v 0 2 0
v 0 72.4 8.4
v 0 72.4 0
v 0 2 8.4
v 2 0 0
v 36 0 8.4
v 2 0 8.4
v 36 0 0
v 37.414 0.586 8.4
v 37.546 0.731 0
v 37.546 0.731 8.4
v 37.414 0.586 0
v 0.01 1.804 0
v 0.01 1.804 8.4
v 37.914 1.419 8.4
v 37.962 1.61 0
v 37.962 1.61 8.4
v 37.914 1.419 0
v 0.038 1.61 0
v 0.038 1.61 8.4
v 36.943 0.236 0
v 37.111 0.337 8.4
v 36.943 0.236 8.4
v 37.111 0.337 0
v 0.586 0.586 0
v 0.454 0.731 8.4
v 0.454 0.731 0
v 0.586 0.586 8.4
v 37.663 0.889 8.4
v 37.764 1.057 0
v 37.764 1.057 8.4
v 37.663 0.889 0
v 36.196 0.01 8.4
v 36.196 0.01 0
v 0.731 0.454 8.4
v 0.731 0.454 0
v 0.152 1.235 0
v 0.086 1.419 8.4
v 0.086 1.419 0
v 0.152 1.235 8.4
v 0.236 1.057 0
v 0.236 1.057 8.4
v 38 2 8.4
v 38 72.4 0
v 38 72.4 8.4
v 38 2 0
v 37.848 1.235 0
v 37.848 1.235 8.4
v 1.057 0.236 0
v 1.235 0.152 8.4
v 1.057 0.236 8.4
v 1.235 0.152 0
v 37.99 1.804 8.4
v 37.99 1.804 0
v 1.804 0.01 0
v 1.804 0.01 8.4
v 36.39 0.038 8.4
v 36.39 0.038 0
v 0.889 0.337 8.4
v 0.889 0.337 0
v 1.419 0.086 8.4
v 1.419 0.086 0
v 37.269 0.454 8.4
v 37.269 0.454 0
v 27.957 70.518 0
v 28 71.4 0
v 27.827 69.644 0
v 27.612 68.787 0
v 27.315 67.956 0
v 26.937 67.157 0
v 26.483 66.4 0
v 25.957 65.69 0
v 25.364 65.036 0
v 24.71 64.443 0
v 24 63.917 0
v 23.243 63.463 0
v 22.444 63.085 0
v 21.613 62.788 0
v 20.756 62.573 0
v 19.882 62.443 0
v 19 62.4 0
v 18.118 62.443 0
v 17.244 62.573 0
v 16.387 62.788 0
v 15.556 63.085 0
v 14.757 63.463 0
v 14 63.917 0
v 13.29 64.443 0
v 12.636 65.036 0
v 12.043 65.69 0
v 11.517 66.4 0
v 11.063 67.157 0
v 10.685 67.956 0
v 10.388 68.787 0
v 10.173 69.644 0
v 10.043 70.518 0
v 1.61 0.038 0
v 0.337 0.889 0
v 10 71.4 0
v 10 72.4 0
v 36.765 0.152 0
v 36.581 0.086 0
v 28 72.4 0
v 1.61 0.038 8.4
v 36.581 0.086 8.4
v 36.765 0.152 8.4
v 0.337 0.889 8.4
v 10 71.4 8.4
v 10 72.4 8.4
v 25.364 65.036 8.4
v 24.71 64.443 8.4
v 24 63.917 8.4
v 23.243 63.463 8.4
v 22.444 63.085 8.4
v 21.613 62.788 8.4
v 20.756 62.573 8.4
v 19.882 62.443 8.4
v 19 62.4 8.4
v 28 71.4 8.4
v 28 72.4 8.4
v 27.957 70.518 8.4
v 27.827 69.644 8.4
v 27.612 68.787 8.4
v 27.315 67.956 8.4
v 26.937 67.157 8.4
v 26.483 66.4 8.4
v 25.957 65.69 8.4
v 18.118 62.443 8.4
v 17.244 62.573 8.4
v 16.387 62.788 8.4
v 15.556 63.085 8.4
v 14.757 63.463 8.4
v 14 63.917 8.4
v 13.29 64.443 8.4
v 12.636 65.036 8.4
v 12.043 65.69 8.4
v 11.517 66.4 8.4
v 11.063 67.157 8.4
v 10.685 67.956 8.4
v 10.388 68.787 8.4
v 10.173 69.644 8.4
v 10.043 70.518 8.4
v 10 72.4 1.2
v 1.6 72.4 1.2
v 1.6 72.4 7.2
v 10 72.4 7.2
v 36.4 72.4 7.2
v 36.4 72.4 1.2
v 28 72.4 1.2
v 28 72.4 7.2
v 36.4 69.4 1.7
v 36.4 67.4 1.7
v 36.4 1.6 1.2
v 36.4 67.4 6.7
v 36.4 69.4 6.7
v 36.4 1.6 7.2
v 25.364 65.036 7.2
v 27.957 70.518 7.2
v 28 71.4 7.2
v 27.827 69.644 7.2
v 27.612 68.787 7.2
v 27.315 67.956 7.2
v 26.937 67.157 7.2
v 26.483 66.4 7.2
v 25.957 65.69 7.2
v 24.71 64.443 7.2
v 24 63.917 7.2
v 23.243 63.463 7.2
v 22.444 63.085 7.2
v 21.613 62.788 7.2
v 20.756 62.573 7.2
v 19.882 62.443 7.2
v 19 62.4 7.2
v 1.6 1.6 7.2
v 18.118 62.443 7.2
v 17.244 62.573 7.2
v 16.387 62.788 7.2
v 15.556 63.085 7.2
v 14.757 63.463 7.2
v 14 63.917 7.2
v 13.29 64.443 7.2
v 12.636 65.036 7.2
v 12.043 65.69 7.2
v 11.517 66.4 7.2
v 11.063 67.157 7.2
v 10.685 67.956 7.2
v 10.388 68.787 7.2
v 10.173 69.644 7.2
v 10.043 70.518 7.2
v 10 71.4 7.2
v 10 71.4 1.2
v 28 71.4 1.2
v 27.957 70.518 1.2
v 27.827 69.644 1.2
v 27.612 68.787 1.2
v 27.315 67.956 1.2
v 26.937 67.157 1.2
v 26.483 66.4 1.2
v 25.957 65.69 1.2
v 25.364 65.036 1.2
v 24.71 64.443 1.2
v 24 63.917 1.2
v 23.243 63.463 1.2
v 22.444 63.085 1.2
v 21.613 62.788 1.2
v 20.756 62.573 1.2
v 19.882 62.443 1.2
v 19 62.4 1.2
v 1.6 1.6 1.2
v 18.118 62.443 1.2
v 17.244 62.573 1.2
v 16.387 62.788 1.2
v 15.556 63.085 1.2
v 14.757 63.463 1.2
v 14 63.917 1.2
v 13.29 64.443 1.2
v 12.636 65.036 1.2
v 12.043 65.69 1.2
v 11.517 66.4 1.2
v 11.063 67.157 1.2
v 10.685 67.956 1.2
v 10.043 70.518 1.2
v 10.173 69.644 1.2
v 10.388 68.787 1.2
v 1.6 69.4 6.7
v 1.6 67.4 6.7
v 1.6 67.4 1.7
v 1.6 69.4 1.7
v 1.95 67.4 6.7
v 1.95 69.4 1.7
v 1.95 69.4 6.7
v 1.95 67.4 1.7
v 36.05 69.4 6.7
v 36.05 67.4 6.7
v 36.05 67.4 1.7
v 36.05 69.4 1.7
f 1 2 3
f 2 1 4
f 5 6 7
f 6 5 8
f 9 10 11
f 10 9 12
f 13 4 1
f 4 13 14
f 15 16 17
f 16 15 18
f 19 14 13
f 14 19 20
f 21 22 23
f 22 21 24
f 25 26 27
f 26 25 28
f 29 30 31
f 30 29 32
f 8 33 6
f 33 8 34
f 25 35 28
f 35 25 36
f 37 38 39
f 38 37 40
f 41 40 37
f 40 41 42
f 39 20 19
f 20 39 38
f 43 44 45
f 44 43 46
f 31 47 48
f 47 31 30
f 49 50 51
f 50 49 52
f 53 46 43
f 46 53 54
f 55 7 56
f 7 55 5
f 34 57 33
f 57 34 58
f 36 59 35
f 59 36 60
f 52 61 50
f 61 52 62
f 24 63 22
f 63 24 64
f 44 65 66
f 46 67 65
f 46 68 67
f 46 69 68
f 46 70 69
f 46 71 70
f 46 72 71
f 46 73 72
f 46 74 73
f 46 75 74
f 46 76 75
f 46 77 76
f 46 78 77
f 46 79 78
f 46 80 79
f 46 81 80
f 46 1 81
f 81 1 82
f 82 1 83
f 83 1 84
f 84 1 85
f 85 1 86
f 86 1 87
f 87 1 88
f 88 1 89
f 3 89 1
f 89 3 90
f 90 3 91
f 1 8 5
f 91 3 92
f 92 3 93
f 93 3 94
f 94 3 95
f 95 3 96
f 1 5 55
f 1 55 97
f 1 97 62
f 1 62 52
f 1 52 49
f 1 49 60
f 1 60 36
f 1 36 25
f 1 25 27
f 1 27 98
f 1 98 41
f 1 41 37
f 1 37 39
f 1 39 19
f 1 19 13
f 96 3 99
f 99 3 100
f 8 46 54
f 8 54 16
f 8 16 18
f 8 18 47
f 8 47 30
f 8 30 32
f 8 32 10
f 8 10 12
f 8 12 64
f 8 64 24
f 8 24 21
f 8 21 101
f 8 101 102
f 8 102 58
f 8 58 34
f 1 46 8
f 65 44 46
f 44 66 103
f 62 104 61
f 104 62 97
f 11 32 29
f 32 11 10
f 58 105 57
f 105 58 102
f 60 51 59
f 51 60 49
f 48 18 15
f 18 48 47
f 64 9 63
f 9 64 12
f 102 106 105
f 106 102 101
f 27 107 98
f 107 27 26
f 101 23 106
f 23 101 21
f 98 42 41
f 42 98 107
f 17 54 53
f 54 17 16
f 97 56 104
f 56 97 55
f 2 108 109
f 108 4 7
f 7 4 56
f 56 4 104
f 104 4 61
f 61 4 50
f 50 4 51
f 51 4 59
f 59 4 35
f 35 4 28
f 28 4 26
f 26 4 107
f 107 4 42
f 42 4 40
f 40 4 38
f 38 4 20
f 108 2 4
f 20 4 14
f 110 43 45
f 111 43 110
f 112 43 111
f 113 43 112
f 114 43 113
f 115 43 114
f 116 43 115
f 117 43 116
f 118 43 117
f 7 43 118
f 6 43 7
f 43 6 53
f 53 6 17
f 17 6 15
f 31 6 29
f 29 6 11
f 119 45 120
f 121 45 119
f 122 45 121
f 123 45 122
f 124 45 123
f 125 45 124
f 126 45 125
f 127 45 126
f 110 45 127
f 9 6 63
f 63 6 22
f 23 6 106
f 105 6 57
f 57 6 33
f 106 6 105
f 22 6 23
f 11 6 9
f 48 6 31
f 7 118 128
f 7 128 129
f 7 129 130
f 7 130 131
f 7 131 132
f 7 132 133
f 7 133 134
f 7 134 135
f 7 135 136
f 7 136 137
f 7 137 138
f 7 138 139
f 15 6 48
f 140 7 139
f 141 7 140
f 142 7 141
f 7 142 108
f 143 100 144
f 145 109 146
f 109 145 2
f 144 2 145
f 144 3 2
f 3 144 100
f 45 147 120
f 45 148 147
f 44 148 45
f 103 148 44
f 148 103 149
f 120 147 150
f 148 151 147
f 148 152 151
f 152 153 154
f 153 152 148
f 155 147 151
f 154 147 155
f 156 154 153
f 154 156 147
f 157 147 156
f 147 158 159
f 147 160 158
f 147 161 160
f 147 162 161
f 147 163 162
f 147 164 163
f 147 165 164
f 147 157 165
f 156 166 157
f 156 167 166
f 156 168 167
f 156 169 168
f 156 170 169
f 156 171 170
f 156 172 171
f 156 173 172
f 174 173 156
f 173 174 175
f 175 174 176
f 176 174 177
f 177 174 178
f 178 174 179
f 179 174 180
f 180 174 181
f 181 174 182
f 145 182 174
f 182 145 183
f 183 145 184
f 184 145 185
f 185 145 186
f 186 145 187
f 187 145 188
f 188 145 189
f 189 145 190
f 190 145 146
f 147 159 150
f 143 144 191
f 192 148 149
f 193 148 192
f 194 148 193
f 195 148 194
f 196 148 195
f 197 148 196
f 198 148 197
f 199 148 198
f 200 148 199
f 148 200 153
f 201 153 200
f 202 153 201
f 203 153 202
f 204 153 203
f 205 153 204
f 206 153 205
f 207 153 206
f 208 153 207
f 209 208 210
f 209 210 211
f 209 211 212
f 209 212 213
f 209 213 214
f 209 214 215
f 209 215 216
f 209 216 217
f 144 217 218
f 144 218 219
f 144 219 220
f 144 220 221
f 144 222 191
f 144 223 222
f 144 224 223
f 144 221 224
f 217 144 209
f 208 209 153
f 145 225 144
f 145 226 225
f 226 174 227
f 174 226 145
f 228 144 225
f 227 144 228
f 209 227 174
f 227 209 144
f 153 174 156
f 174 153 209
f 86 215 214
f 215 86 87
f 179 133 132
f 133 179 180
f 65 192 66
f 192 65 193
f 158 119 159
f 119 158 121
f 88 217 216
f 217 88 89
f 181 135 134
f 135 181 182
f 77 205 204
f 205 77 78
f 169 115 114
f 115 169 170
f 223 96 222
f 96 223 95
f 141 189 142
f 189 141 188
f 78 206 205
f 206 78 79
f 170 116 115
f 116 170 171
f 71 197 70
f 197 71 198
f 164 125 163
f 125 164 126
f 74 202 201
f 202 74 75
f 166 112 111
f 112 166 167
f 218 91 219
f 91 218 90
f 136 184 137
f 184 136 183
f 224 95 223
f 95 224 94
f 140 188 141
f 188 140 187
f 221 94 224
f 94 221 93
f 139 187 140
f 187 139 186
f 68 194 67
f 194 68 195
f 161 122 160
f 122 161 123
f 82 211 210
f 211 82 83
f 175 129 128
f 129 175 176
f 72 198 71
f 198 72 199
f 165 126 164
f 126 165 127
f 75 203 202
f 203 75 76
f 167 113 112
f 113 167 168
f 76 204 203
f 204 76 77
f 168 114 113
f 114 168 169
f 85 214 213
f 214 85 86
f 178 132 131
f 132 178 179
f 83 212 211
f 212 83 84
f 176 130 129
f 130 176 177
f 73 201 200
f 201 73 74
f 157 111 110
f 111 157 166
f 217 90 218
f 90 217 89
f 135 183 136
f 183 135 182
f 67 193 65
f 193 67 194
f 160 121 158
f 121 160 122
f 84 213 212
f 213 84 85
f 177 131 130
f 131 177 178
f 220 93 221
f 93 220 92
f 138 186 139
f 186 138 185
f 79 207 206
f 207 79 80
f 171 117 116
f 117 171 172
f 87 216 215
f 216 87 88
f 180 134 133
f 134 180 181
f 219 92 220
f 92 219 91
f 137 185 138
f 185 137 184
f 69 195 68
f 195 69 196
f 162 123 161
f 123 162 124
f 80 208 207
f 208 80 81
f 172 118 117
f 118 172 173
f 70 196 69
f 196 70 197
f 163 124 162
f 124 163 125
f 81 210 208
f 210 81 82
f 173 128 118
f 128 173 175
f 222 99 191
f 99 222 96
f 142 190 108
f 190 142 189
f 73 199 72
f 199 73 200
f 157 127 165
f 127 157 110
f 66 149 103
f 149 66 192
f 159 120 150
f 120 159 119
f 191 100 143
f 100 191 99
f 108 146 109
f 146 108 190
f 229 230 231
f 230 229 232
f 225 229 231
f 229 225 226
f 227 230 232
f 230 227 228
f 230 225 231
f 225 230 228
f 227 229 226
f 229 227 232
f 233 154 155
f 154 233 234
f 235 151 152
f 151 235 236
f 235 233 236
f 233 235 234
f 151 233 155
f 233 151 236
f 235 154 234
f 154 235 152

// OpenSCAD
// EC2M2 case (transport/storage) - same geometry as gen/enclosure.py
width = 34;  // 34 or 54
board_len = 70.0; clear = 0.4; inner_h = 6.0;
wall = 1.6; skin = 1.2; r = 2.0; notch_w = 18.0; notch_d = 10.0; bump = 0.35;
iw = width + 2*clear; il = board_len + 2*clear; ih = inner_h;
ow = iw + 2*wall; ol = il + wall; oh = ih + 2*skin;
$fn = 64;
module rbox(x, y, z) hull() for (cx = [r, x-r], cy = [r, y-r]) translate([cx, cy, 0]) cylinder(h = z, r = r);
union() {
  difference() {
    intersection() { rbox(ow, ol + r, oh); cube([ow, ol, oh]); }
    translate([wall, wall, skin]) cube([iw, il + 1, ih]);
    translate([ow/2, ol - notch_d + notch_w/2, -1]) cylinder(h = oh + 2, r = notch_w/2);
    translate([ow/2 - notch_w/2, ol - notch_d + notch_w/2, -1]) cube([notch_w, notch_d, oh + 2]);
  }
  for (x0 = [wall, wall + iw - bump]) translate([x0, ol - 5, skin + 0.5]) cube([bump, 2, ih - 1]);
}
